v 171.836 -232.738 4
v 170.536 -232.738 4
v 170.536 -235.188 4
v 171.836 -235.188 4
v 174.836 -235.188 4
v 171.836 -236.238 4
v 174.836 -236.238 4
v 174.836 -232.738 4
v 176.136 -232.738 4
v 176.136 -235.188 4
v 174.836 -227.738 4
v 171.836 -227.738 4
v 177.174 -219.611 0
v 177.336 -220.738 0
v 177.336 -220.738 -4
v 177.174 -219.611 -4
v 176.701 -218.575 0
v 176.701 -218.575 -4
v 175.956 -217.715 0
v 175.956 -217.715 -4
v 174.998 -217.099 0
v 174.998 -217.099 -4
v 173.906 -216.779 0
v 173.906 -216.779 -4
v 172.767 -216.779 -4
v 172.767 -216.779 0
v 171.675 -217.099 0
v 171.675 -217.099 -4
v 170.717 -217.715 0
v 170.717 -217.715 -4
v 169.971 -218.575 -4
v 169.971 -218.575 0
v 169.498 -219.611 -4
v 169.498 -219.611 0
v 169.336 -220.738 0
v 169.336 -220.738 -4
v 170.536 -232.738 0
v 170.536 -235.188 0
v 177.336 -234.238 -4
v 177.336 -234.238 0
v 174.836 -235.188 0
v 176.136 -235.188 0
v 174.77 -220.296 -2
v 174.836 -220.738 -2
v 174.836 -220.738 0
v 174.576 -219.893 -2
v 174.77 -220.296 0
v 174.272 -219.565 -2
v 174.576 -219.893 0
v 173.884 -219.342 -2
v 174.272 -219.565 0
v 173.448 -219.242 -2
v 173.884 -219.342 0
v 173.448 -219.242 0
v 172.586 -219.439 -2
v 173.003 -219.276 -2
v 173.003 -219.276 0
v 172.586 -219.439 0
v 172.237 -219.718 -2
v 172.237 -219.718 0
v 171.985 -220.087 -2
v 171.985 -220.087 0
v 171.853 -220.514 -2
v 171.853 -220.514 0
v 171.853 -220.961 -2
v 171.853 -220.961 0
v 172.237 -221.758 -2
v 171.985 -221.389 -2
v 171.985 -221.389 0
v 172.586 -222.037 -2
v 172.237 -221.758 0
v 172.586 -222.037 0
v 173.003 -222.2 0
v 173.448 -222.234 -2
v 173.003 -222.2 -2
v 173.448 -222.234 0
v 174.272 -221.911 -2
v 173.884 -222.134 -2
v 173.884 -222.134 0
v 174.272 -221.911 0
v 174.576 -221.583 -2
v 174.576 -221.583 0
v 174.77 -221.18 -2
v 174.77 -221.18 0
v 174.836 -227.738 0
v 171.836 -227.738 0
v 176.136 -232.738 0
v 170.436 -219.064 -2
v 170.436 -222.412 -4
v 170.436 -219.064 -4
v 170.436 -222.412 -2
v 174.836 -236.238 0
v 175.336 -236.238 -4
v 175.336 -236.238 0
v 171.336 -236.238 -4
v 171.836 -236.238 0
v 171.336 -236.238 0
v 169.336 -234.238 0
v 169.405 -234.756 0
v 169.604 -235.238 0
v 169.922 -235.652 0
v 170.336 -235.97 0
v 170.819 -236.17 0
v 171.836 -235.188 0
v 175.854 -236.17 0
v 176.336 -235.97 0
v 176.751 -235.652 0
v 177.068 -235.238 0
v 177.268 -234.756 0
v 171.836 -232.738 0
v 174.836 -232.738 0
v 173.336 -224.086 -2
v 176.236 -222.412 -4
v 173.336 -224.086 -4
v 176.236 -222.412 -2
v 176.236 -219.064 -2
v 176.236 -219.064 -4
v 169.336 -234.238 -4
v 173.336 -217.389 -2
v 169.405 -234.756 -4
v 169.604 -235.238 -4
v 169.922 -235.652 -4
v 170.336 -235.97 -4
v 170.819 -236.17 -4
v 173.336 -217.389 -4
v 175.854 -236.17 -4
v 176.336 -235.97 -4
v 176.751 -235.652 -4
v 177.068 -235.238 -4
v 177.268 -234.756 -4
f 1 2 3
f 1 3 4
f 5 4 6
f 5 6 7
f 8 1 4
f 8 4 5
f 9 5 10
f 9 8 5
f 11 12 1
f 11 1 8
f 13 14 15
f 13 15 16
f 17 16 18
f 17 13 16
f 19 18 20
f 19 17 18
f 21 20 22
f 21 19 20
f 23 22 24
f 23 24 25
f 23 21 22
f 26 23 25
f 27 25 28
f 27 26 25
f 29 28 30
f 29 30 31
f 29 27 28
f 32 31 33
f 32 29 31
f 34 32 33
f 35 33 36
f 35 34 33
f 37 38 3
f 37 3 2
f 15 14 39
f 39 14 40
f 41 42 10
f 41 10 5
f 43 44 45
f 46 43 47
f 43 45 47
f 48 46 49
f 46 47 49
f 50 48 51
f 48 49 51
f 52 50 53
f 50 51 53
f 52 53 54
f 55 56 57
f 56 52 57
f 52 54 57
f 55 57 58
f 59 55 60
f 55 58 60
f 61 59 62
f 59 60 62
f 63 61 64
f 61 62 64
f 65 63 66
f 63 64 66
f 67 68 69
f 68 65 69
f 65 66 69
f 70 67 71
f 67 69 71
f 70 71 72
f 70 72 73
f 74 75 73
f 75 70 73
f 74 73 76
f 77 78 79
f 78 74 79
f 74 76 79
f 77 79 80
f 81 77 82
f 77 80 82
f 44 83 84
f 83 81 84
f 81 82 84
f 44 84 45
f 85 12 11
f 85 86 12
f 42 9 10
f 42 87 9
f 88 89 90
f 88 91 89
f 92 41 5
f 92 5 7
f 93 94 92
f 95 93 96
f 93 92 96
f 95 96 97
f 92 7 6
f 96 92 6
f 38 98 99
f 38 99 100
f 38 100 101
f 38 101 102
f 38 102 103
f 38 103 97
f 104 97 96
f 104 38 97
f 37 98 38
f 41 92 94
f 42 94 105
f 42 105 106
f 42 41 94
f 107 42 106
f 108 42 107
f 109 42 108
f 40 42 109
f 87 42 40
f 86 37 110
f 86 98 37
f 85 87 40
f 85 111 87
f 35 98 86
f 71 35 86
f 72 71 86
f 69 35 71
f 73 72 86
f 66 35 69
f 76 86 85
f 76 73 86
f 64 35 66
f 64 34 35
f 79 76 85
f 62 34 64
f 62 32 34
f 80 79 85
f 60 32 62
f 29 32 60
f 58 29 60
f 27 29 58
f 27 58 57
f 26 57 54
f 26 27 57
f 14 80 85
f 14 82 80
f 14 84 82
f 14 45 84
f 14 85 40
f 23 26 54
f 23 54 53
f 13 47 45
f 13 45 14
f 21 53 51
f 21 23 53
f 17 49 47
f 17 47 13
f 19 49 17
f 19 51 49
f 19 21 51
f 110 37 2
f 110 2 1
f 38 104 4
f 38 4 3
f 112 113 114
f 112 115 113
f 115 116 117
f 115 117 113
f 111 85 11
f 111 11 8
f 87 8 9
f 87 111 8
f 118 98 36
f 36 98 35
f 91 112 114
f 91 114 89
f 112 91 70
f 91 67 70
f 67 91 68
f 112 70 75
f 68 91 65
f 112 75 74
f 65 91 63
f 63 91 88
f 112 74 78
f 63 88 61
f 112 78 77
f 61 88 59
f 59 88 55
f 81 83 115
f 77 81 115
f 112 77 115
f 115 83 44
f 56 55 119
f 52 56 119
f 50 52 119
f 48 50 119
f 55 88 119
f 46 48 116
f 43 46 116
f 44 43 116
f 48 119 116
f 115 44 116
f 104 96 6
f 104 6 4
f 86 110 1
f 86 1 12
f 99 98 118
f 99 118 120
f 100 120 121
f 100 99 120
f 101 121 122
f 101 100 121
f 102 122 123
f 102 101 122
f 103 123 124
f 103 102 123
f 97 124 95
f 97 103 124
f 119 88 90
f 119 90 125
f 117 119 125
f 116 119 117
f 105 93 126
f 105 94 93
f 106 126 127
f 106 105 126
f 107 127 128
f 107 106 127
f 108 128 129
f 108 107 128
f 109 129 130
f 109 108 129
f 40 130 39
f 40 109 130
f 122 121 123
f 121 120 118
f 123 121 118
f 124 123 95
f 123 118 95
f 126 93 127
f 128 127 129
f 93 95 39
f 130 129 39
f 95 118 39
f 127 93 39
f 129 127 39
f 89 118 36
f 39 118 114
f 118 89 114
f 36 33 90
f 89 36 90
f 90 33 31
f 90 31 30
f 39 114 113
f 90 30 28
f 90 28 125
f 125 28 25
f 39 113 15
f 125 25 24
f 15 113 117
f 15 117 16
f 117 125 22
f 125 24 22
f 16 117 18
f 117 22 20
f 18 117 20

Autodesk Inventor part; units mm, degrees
ref_plane "YZ Plane" through (0, 0, 0) normal (1, 0, 0) x (0, 1, 0)
ref_plane "XZ Plane" through (0, 0, 0) normal (0, 1, 0) x (-1, 0, 0)
ref_plane "XY Plane" through (0, 0, 0) normal (0, 0, 1) x (1, 0, 0)
sketch "Эскиз1" plane through (0, 0, 0) normal (0, 0, 1) x (1, 0, 0)
  line L0 (330.6864, -227.7379) -> (330.6864, -232.7379)
  line L1 (330.6864, -232.7379) -> (331.9864, -232.7379)
  line L2 (331.9864, -232.7379) -> (331.9864, -235.1879)
  line L3 (331.9864, -235.1879) -> (330.6864, -235.1879)
  line L4 (330.6864, -235.1879) -> (330.6864, -236.2379)
  line L5 (330.6864, -236.2379) -> (327.6864, -236.2379)
  line L6 (327.6864, -236.2379) -> (327.6864, -235.1879)
  line L7 (327.6864, -235.1879) -> (326.3864, -235.1879)
  line L8 (326.3864, -235.1879) -> (326.3864, -232.7379)
  line L9 (326.3864, -232.7379) -> (327.6864, -232.7379)
  line L10 (327.6864, -232.7379) -> (327.6864, -227.7379)
  line L11 (327.6864, -227.7379) -> (289.8864, -227.7379)
  line L12 (289.8864, -227.7379) -> (289.8864, -223.7379)
  line L13 (289.8864, -223.7379) -> (212.4864, -223.7379)
  line L14 (212.4864, -223.7379) -> (212.4864, -227.7379)
  line L15 (212.4864, -227.7379) -> (174.8364, -227.7379)
  line L16 (174.8364, -227.7379) -> (174.8364, -232.7379)
  line L17 (174.8364, -232.7379) -> (176.1364, -232.7379)
  line L18 (176.1364, -232.7379) -> (176.1364, -235.1879)
  line L19 (176.1364, -235.1879) -> (174.8364, -235.1879)
  line L20 (174.8364, -235.1879) -> (174.8364, -236.2379)
  line L21 (174.8364, -236.2379) -> (171.8364, -236.2379)
  line L22 (171.8364, -236.2379) -> (171.8364, -235.1879)
  line L23 (171.8364, -235.1879) -> (170.5364, -235.1879)
  line L24 (170.5364, -235.1879) -> (170.5364, -232.7379)
  line L25 (170.5364, -232.7379) -> (171.8364, -232.7379)
  line L26 (171.8364, -232.7379) -> (171.8364, -227.7379)
  line L27 (171.8364, -227.7379) -> (134.1864, -227.7379)
  line L28 (134.1864, -227.7379) -> (134.1864, -735.7379) projected
  line L29 (134.1864, -735.7379) -> (184.1864, -735.7379) projected
  line L30 (184.1864, -735.7379) -> (184.1864, -437.7379) projected
  line L31 (184.1864, -437.7379) -> (204.1864, -417.7379)
  line L32 (204.1864, -417.7379) -> (454.1864, -417.7379)
  line L33 (454.1864, -417.7379) -> (474.1864, -437.7379)
  line L34 (474.1864, -437.7379) -> (474.1864, -735.7379) projected
  line L35 (474.1864, -735.7379) -> (524.1864, -735.7379) projected
  line L36 (524.1864, -735.7379) -> (524.1864, -227.7379) projected
  line L37 (524.1864, -227.7379) -> (486.5364, -227.7379)
  line L38 (486.5364, -227.7379) -> (486.5364, -232.7379)
  line L39 (486.5364, -232.7379) -> (487.8364, -232.7379)
  line L40 (487.8364, -232.7379) -> (487.8364, -235.1879)
  line L41 (487.8364, -235.1879) -> (486.5364, -235.1879)
  line L42 (486.5364, -235.1879) -> (486.5364, -236.2379)
  line L43 (486.5364, -236.2379) -> (483.5364, -236.2379)
  line L44 (483.5364, -236.2379) -> (483.5364, -235.1879)
  line L45 (483.5364, -235.1879) -> (482.2364, -235.1879)
  line L46 (482.2364, -235.1879) -> (482.2364, -232.7379)
  line L47 (482.2364, -232.7379) -> (483.5364, -232.7379)
  line L48 (483.5364, -232.7379) -> (483.5364, -227.7379)
  line L49 (483.5364, -227.7379) -> (445.8864, -227.7379)
  line L50 (445.8864, -227.7379) -> (445.8864, -223.7379)
  line L51 (445.8864, -223.7379) -> (368.4864, -223.7379)
  line L52 (368.4864, -223.7379) -> (368.4864, -227.7379)
  line L53 (368.4864, -227.7379) -> (330.6864, -227.7379)
  circle A0 centre (510.1864, -385.7379) radius 5
  circle A1 centre (148.1864, -385.7379) radius 5
  circle A2 centre (150.1864, -412.7379) radius 5
  circle A3 centre (508.1864, -412.7379) radius 5
  line L54 (198.0365, -283.9874) -> (198.0365, -274.4874)
  arc A4 (198.2865, -274.2374) -> (198.0365, -274.4874) centre (198.2865, -274.4874) ccw
  line L55 (198.2865, -274.2374) -> (220.2865, -274.2374)
  arc A5 (220.5365, -274.4874) -> (220.2865, -274.2374) centre (220.2865, -274.4874) ccw
  line L56 (220.5365, -274.4874) -> (220.5365, -283.9874)
  arc A6 (220.2865, -284.2374) -> (220.5365, -283.9874) centre (220.2865, -283.9874) ccw
  line L57 (220.2865, -284.2374) -> (198.2865, -284.2374)
  arc A7 (198.0365, -283.9874) -> (198.2865, -284.2374) centre (198.2865, -283.9874) ccw
  spline S0 degree 4 poles (220.5005, -310.507) (220.5003, -310.0397) (220.4543, -309.4219) (220.3063, -308.6946) (219.9828, -307.9126) (219.5846, -307.2407) (219.1485, -306.7849) (218.7486, -306.4926) (218.4341, -306.3133) knots 0 0 0 0 0 0.333261 0.458786 0.580687 0.70052 1 1 1 1 1
  spline S1 degree 4 poles (218.4341, -306.3133) (218.2194, -306.2045) (217.9574, -306.0638) (217.2245, -305.8515) (216.8112, -305.759) (215.0952, -305.8521) (214.8239, -305.815) knots 0 0 0 0 0 0.331948 0.48487 1 1 1 1 1
  line L58 (214.8239, -305.815) -> (210.9827, -305.815)
  line L59 (210.9827, -305.815) -> (210.9827, -303.0192)
  line L60 (210.9827, -303.0192) -> (215.6262, -303.0192)
  spline S2 degree 4 poles (215.6262, -303.0192) (216.0632, -302.9791) (218.3041, -303.1205) (219.1074, -303.2602) (220.3376, -303.6977) (220.8048, -303.9727) (221.1813, -304.1983) knots 0 0 0 0 0 0.48869 0.646796 1 1 1 1 1
  spline S3 degree 4 poles (221.1813, -304.1983) (221.6328, -304.4905) (222.2206, -304.9662) (222.87, -305.6808) (223.5166, -306.727) (224.0456, -307.8865) (224.2868, -308.9631) (224.3652, -309.8569) (224.366, -310.5313) knots 0 0 0 0 0 0.30127 0.423004 0.546367 0.672176 1 1 1 1 1
  spline S4 degree 4 poles (224.366, -310.5313) (224.3672, -311.1836) (224.2819, -312.0637) (224.0275, -313.128) (223.4629, -314.3083) (222.7851, -315.3791) (222.1412, -316.0885) (221.5656, -316.5539) (221.1326, -316.8279) knots 0 0 0 0 0 0.325829 0.453052 0.578284 0.70143 1 1 1 1 1
  spline S5 degree 4 poles (221.1326, -316.8279) (220.7893, -317.0305) (220.3484, -317.2658) (219.1646, -317.6777) (218.3558, -317.7448) (216.0857, -318.1145) (215.6748, -318.0192) knots 0 0 0 0 0 0.345082 0.503845 1 1 1 1 1
  line L61 (215.6748, -318.0192) -> (210.9827, -318.0192)
  line L62 (210.9827, -318.0192) -> (210.9827, -315.2112)
  line L63 (210.9827, -315.2112) -> (214.8239, -315.2112)
  spline S6 degree 4 poles (214.8239, -315.2112) (215.1741, -315.246) (216.9237, -315.0068) (217.3918, -315.0434) (218.1403, -314.8454) (218.4072, -314.7315) (218.6164, -314.6278) knots 0 0 0 0 0 0.523746 0.675711 1 1 1 1 1
  spline S7 degree 4 poles (218.6164, -314.6278) (218.8947, -314.4519) (219.2518, -314.164) (219.6429, -313.721) (220.0126, -313.068) (220.3184, -312.3077) (220.4565, -311.5867) (220.5004, -310.9747) (220.5005, -310.507) knots 0 0 0 0 0 0.293933 0.413176 0.535292 0.661734 1 1 1 1 1
  line L64 (206.7865, -285.7374) -> (206.7865, -284.7374)
  line L65 (206.7865, -284.7374) -> (211.7865, -284.7374)
  line L66 (211.7865, -284.7374) -> (211.7865, -285.7374)
  line L67 (211.7865, -285.7374) -> (213.7865, -285.7374)
  line L68 (213.7865, -285.7374) -> (213.7865, -288.7374)
  spline S8 degree 4 poles (213.7865, -288.7374) (213.6519, -288.8139) (213.4737, -288.7819) (213.3015, -288.643) (213.0567, -288.4771) (212.69, -288.3556) (212.2603, -288.4723) (211.871, -288.6284) (211.5365, -288.7374) knots 0 0 0 0 0 0.262205 0.367936 0.481015 0.607227 1 1 1 1 1
  spline S9 degree 4 poles (211.5365, -288.7374) (211.1505, -288.9432) (210.6435, -289.1648) (210.0259, -289.3413) (209.2886, -289.3933) (208.5507, -289.3412) (207.9319, -289.1646) (207.4237, -288.9431) (207.0365, -288.7374) knots 0 0 0 0 0 0.321352 0.440904 0.558717 0.678328 1 1 1 1 1
  spline S10 degree 4 poles (207.0365, -288.7374) (206.8474, -288.9124) (206.596, -289.091) (206.2892, -289.2192) (205.9233, -289.2608) (205.553, -289.2318) (205.2381, -289.1011) (204.981, -288.9152) (204.7865, -288.7374) knots 0 0 0 0 0 0.325734 0.441296 0.554264 0.670467 1 1 1 1 1
  line L69 (204.7865, -288.7374) -> (204.7865, -285.7374)
  line L70 (204.7865, -285.7374) -> (206.7865, -285.7374)
  line L71 (209.6615, -293.1605) -> (208.9115, -293.1605)
  line L72 (208.9115, -293.1605) -> (205.8815, -289.9115)
  spline S11 degree 4 poles (205.8815, -289.9115) (205.9805, -289.9087) (206.1201, -289.8928) (206.2986, -289.8511) (206.5123, -289.7699) (206.7297, -289.6659) (206.9037, -289.5566) (207.0382, -289.4574) (207.1348, -289.3787) knots 0 0 0 0 0 0.300687 0.4228 0.546613 0.672716 1 1 1 1 1
  spline S12 degree 4 poles (207.1348, -289.3787) (207.4869, -289.5458) (207.9624, -289.7299) (208.5607, -289.88) (209.2865, -289.9251) (210.0123, -289.88) (210.6106, -289.7298) (211.0863, -289.5458) (211.4383, -289.3787) knots 0 0 0 0 0 0.318028 0.439699 0.56029 0.681964 1 1 1 1 1
  spline S13 degree 4 poles (211.4383, -289.3787) (211.5621, -289.4198) (211.726, -289.4782) (211.9234, -289.5547) (212.1488, -289.6486) (212.3519, -289.7369) (212.5071, -289.8094) (212.6189, -289.8675) (212.6916, -289.9115) knots 0 0 0 0 0 0.337221 0.465736 0.590517 0.711668 1 1 1 1 1
  line L73 (212.6916, -289.9115) -> (209.6615, -293.1605)
  line L74 (214.751, -315.1701) -> (210.9827, -315.1701)
  line L75 (210.9827, -315.1701) -> (210.9827, -305.8193)
  line L76 (210.9827, -305.8193) -> (214.751, -305.8193)
  line L77 (214.751, -305.8193) -> (214.751, -315.1701)
  arc A8 (209.7865, -300.4106) -> (208.2865, -298.9106) centre (208.2865, -300.4106) ccw
  line L78 (209.7865, -300.4106) -> (209.7865, -300.9106)
  line L79 (209.7865, -300.9106) -> (208.7865, -300.9106)
  line L80 (208.7865, -300.9106) -> (208.7865, -300.4106)
  arc A9 (208.7865, -300.4106) -> (208.2865, -299.9106) centre (208.2865, -300.4106) ccw
  line L81 (208.2865, -299.9106) -> (201.7865, -299.9106)
  arc A10 (201.7865, -296.9106) -> (201.7865, -299.9106) centre (201.7865, -298.4106) ccw
  line L82 (201.7865, -296.9106) -> (216.7865, -296.9106)
  arc A11 (216.7865, -296.9106) -> (216.7865, -295.9106) centre (216.7865, -296.4106) ccw
  line L83 (216.7865, -295.9106) -> (210.2865, -295.9106)
  arc A12 (208.7865, -294.4106) -> (210.2865, -295.9106) centre (210.2865, -294.4106) ccw
  line L84 (208.7865, -294.4106) -> (208.7865, -293.9106)
  line L85 (208.7865, -293.9106) -> (209.7865, -293.9106)
  line L86 (209.7865, -293.9106) -> (209.7865, -294.4106)
  arc A13 (209.7865, -294.4106) -> (210.2865, -294.9106) centre (210.2865, -294.4106) ccw
  line L87 (210.2865, -294.9106) -> (216.7865, -294.9106)
  arc A14 (216.7865, -297.9106) -> (216.7865, -294.9106) centre (216.7865, -296.4106) ccw
  line L88 (216.7865, -297.9106) -> (201.7865, -297.9106)
  arc A15 (201.7865, -297.9106) -> (201.7865, -298.9106) centre (201.7865, -298.4106) ccw
  line L89 (201.7865, -298.9106) -> (208.2865, -298.9106)
  spline S14 degree 4 poles (206.5338, -303.6148) (206.7685, -303.7597) (207.0659, -303.9867) (207.3902, -304.3236) (207.6872, -304.8028) (207.9226, -305.3279) (208.031, -305.7914) (208.0657, -306.1761) (208.0654, -306.4592) knots 0 0 0 0 0 0.312949 0.435922 0.558791 0.682637 1 1 1 1 1
  spline S15 degree 4 poles (208.0654, -306.4592) (208.0667, -306.8455) (207.9969, -307.373) (207.7865, -307.9991) (207.3334, -308.6976) (206.7816, -309.3133) (206.2308, -309.6699) (205.74, -309.8607) (205.3668, -309.9479) knots 0 0 0 0 0 0.313918 0.438715 0.563217 0.687663 1 1 1 1 1
  line L90 (205.3668, -309.9479) -> (205.3668, -310.0937)
  spline S16 degree 4 poles (205.3668, -310.0937) (205.5312, -310.0712) (206.2732, -310.3709) (206.5855, -310.4525) (207.0618, -310.7261) (207.2515, -310.8673) (207.409, -310.9933) knots 0 0 0 0 0 0.467412 0.627499 1 1 1 1 1
  spline S17 degree 4 poles (207.409, -310.9933) (207.5481, -311.1133) (207.7331, -311.307) (207.9398, -311.5886) (208.1607, -311.9975) (208.3429, -312.4401) (208.4267, -312.8625) (208.4538, -313.2077) (208.4544, -313.473) knots 0 0 0 0 0 0.293401 0.414689 0.538726 0.665972 1 1 1 1 1
  spline S18 degree 4 poles (208.4544, -313.473) (208.4542, -313.8182) (208.4167, -314.2867) (208.3007, -314.8566) (208.0496, -315.5046) (207.7363, -316.1003) (207.4002, -316.53) (207.0921, -316.8283) (206.8498, -317.0224) knots 0 0 0 0 0 0.321122 0.446176 0.569734 0.692519 1 1 1 1 1
  spline S19 degree 4 poles (206.8498, -317.0224) (206.6091, -317.215) (206.2427, -317.4621) (205.7289, -317.7312) (205.0243, -317.9925) (204.2362, -318.2079) (203.4791, -318.3046) (202.8516, -318.3351) (202.3644, -318.3352) knots 0 0 0 0 0 0.288505 0.407246 0.52959 0.656869 1 1 1 1 1
  spline S20 degree 4 poles (202.3644, -318.3352) (200.7651, -318.3047) (199.5638, -318.1496) (198.2039, -317.74) (197.3198, -317.3871) knots 0 0 0 0 0 1 1 1 1 1
  line L91 (197.3198, -317.3871) -> (197.3198, -314.1294)
  line L92 (197.3198, -314.1294) -> (197.6845, -314.1294)
  spline S21 degree 4 poles (197.6845, -314.1294) (197.8963, -314.3375) (199.3348, -314.8985) (200.0458, -315.1512) (200.9862, -315.3661) (201.3735, -315.4088) (201.6594, -315.43) knots 0 0 0 0 0 0.485606 0.650571 1 1 1 1 1
  spline S22 degree 4 poles (201.6594, -315.43) (201.8017, -315.4566) (202.7287, -315.3618) (203.1091, -315.3075) (203.6053, -315.1248) (203.7864, -315.012) (203.9203, -314.9195) knots 0 0 0 0 0 0.490597 0.653392 1 1 1 1 1
  spline S23 degree 4 poles (203.9203, -314.9195) (204.0251, -314.8403) (204.1632, -314.7177) (204.3146, -314.5417) (204.4732, -314.2933) (204.5993, -314.0182) (204.6569, -313.7148) (204.6734, -313.4623) (204.674, -313.2542) knots 0 0 0 0 0 0.293695 0.410721 0.530018 0.654429 1 1 1 1 1
  spline S24 degree 4 poles (204.674, -313.2542) (204.6737, -313.05) (204.65, -312.7949) (204.5704, -312.5) (204.3941, -312.2275) (204.1685, -311.9914) (203.9524, -311.8427) (203.754, -311.7508) (203.6043, -311.6983) knots 0 0 0 0 0 0.332874 0.455336 0.574642 0.693712 1 1 1 1 1
  spline S25 degree 3 poles (203.6043, -311.6983) (203.1339, -311.419) (202.8478, -311.2752) (201.2461, -311.4916) knots 0 0 0 0 1 1 1 1
  line L93 (201.2461, -311.4916) -> (200.6018, -311.4916)
  line L94 (200.6018, -311.4916) -> (200.6018, -308.8539)
  line L95 (200.6018, -308.8539) -> (201.1975, -308.8539)
  spline S26 degree 4 poles (201.1975, -308.8539) (201.8646, -308.8347) (202.5816, -308.7738) (203.0974, -308.7347) (203.4341, -308.55) knots 0 0 0 0 0 1 1 1 1 1
  spline S27 degree 4 poles (203.4341, -308.55) (203.5568, -308.4899) (203.7161, -308.3919) (203.8905, -308.2415) (204.0639, -308.0177) (204.2017, -307.7644) (204.265, -307.4981) (204.2843, -307.2719) (204.285, -307.0913) knots 0 0 0 0 0 0.303428 0.422137 0.541736 0.664935 1 1 1 1 1
  spline S28 degree 4 poles (204.285, -307.0913) (204.2846, -306.9506) (204.2677, -306.7719) (204.2092, -306.5582) (204.0845, -306.3506) (203.9226, -306.1579) (203.7804, -306.033) (203.6505, -305.9492) (203.5557, -305.9001) knots 0 0 0 0 0 0.328861 0.453441 0.575803 0.697309 1 1 1 1 1
  spline S29 degree 4 poles (203.5557, -305.9001) (203.4448, -305.8495) (203.2969, -305.7896) (202.9114, -305.6871) (202.6272, -305.6603) (201.9555, -305.5746) (201.8782, -305.5962) knots 0 0 0 0 0 0.352064 0.518119 1 1 1 1 1
  spline S30 degree 4 poles (201.8782, -305.5962) (201.3241, -305.5966) (200.7829, -305.6848) (200.1681, -305.8558) (199.6416, -306.0581) knots 0 0 0 0 0 1 1 1 1 1
  spline S31 degree 3 poles (199.6416, -306.0581) (200.0559, -305.6978) (203.2118, -303.6988) (198.2887, -306.7332) knots 0 0 0 0 1 1 1 1
  line L96 (198.2887, -306.7332) -> (197.8235, -306.8604)
  line L97 (197.8235, -306.8604) -> (197.7574, -306.8604)
  line L98 (197.7574, -306.8604) -> (197.7574, -303.6513)
  spline S32 degree 4 poles (197.7574, -303.6513) (198.6005, -303.3178) (200.0612, -302.9118) (201.2135, -302.7136) (202.5346, -302.7031) knots 0 0 0 0 0 1 1 1 1 1
  spline S33 degree 4 poles (202.5346, -302.7031) (203.7734, -302.7074) (204.8441, -302.8363) (205.7919, -303.1378) (206.5338, -303.6148) knots 0 0 0 0 0 1 1 1 1 1
  line L99 (209.1913, -331.2373) -> (209.1913, -324.7373)
  arc A16 (209.1913, -324.7373) -> (209.1912, -324.7373) centre (209.2865, -297.2374) ccw
  line L100 (209.1912, -324.7373) -> (209.1912, -331.2373)
  arc A17 (204.7865, -330.9383) -> (209.1912, -331.2373) centre (209.2865, -297.2374) ccw
  arc A18 (203.0365, -327.6009) -> (204.7865, -330.9383) centre (216.5671, -322.6337) ccw
  arc A19 (192.2358, -323.127) -> (203.0365, -327.6009) centre (209.2865, -297.2374) ccw
  arc A20 (188.6384, -324.2495) -> (192.2358, -323.127) centre (186.1806, -310.0472) ccw
  arc A21 (182.2744, -317.8856) -> (188.6384, -324.2495) centre (209.2865, -297.2374) ccw
  arc A22 (183.3969, -314.2882) -> (182.2744, -317.8856) centre (196.4768, -320.3434) ccw
  arc A23 (178.9231, -303.4874) -> (183.3969, -314.2882) centre (209.2865, -297.2374) ccw
  arc A24 (175.5856, -301.7374) -> (178.9231, -303.4874) centre (183.8903, -289.9569) ccw
  arc A25 (175.5856, -292.7374) -> (175.5856, -301.7374) centre (209.2865, -297.2374) ccw
  arc A26 (178.9231, -290.9874) -> (175.5856, -292.7374) centre (183.8903, -304.518) ccw
  arc A27 (183.3969, -280.1867) -> (178.9231, -290.9874) centre (209.2865, -297.2374) ccw
  arc A28 (182.2744, -276.5893) -> (183.3969, -280.1867) centre (196.4768, -274.1315) ccw
  arc A29 (188.6384, -270.2253) -> (182.2744, -276.5893) centre (209.2865, -297.2374) ccw
  arc A30 (192.2358, -271.3478) -> (188.6384, -270.2253) centre (186.1806, -284.4277) ccw
  arc A31 (203.0365, -266.874) -> (192.2358, -271.3478) centre (209.2865, -297.2374) ccw
  arc A32 (204.7865, -263.5365) -> (203.0365, -266.874) centre (216.5671, -271.8412) ccw
  arc A33 (213.7865, -263.5365) -> (204.7865, -263.5365) centre (209.2865, -297.2374) ccw
  arc A34 (215.5365, -266.874) -> (213.7865, -263.5365) centre (202.006, -271.8412) ccw
  arc A35 (226.3373, -271.3478) -> (215.5365, -266.874) centre (209.2865, -297.2374) ccw
  arc A36 (229.9347, -270.2253) -> (226.3373, -271.3478) centre (232.3925, -284.4277) ccw
  arc A37 (236.2986, -276.5893) -> (229.9347, -270.2253) centre (209.2865, -297.2374) ccw
  arc A38 (235.1761, -280.1867) -> (236.2986, -276.5893) centre (222.0963, -274.1315) ccw
  arc A39 (239.65, -290.9874) -> (235.1761, -280.1867) centre (209.2865, -297.2374) ccw
  arc A40 (242.9874, -292.7374) -> (239.65, -290.9874) centre (234.6828, -304.518) ccw
  arc A41 (242.9874, -301.7374) -> (242.9874, -292.7374) centre (209.2865, -297.2374) ccw
  arc A42 (239.65, -303.4874) -> (242.9874, -301.7374) centre (234.6828, -289.9569) ccw
  arc A43 (235.1761, -314.2882) -> (239.65, -303.4874) centre (209.2865, -297.2374) ccw
  arc A44 (236.2986, -317.8856) -> (235.1761, -314.2882) centre (222.0963, -320.3434) ccw
  arc A45 (229.9347, -324.2495) -> (236.2986, -317.8856) centre (209.2865, -297.2374) ccw
  arc A46 (226.3373, -323.127) -> (229.9347, -324.2495) centre (232.3925, -310.0472) ccw
  arc A47 (215.5365, -327.6009) -> (226.3373, -323.127) centre (209.2865, -297.2374) ccw
  arc A48 (213.7865, -330.9383) -> (215.5365, -327.6009) centre (202.006, -322.6337) ccw
  arc A49 (209.1913, -331.2373) -> (213.7865, -330.9383) centre (209.2865, -297.2374) ccw
  circle A50 centre (330.1864, -297.7379) radius 20.6
  circle A51 centre (508.6864, -721.7379) radius 2 projected
  circle A52 centre (149.6864, -682.2379) radius 2 projected
  circle A53 centre (149.6864, -424.7379) radius 2
  circle A54 centre (508.6864, -424.7379) radius 2
  circle A55 centre (508.6864, -506.7379) radius 2.875 projected
  circle A56 centre (149.6864, -453.7379) radius 2
  circle A57 centre (149.6864, -721.7379) radius 2 projected
  circle A58 centre (170.4364, -639.7379) radius 1.5 projected
  circle A59 centre (170.4364, -507.7379) radius 1.5 projected
  circle A60 centre (170.4364, -477.7379) radius 1.5
  circle A61 centre (170.4364, -669.7379) radius 1.5 projected
  circle A62 centre (479.4534, -583.2596) radius 1.5 projected
  line L101 (445.4108, -378.2955) -> (445.4108, -381.1733)
  line L102 (445.4108, -381.1733) -> (439.6177, -381.1733)
  line L103 (439.6177, -381.1733) -> (439.3174, -383.1252)
  spline S34 degree 4 poles (439.3174, -383.1252) (439.8832, -382.9763) (440.4727, -382.8362) (441.0568, -382.6943) (441.6697, -382.5621) knots 0 0 0 0 0 1 1 1 1 1
  spline S35 degree 4 poles (441.6697, -382.5621) (442.2638, -382.5598) (443.052, -382.6679) (443.9476, -382.9985) (444.8569, -383.7336) (445.5947, -384.609) (445.9315, -385.4454) (446.0393, -386.1746) (446.0364, -386.7161) knots 0 0 0 0 0 0.321 0.445325 0.568168 0.690637 1 1 1 1 1
  spline S36 degree 4 poles (446.0364, -386.7161) (446.0346, -387.3159) (445.9109, -388.0809) (445.4981, -389.1528) (444.7052, -390.1668) (443.6543, -391.0177) (442.5576, -391.4124) (441.5087, -391.5161) (440.7063, -391.5207) knots 0 0 0 0 0 0.301808 0.422596 0.543783 0.666952 1 1 1 1 1
  spline S37 degree 4 poles (440.7063, -391.5207) (439.918, -391.5188) (438.9727, -391.4394) (437.9148, -391.1682) (436.9202, -390.5588) (436.1038, -389.8278) (435.6627, -389.1519) (435.3981, -388.4698) (435.2385, -387.9298) knots 0 0 0 0 0 0.344288 0.467767 0.585513 0.701061 1 1 1 1 1
  line L104 (435.2385, -387.9298) -> (438.892, -387.5294)
  spline S38 degree 4 poles (438.892, -387.5294) (438.9412, -387.7989) (439.0435, -388.1412) (439.2278, -388.5159) (439.5476, -388.8668) (439.8937, -389.136) (440.207, -389.2665) (440.4728, -389.3137) (440.6687, -389.3186) knots 0 0 0 0 0 0.337823 0.463732 0.585419 0.704571 1 1 1 1 1
  spline S39 degree 4 poles (440.6687, -389.3186) (440.8901, -389.3188) (441.1893, -389.2693) (441.5319, -389.1156) (441.8931, -388.7807) (442.2105, -388.3375) (442.349, -387.842) (442.3952, -387.3979) (442.3954, -387.0414) knots 0 0 0 0 0 0.288865 0.405011 0.524609 0.650411 1 1 1 1 1
  spline S40 degree 4 poles (442.3954, -387.0414) (442.3965, -386.6796) (442.3506, -386.2306) (442.2143, -385.7358) (441.8934, -385.3038) (441.5184, -384.9825) (441.1547, -384.8384) (440.8338, -384.7976) (440.5936, -384.8018) knots 0 0 0 0 0 0.347295 0.471219 0.589277 0.705046 1 1 1 1 1
  spline S41 degree 4 poles (440.5936, -384.8018) (440.3308, -384.8028) (440.0722, -384.8472) (439.8214, -384.9358) (439.5802, -385.0645) knots 0 0 0 0 0 1 1 1 1 1
  spline S42 degree 4 poles (439.5802, -385.0645) (439.4113, -385.0419) (439.2106, -385.2032) (439.0118, -385.4464) (438.7919, -385.7277) knots 0 0 0 0 0 1 1 1 1 1
  line L105 (438.7919, -385.7277) -> (435.714, -385.2897)
  line L106 (435.714, -385.2897) -> (436.8526, -378.2955)
  line L107 (436.8526, -378.2955) -> (445.4108, -378.2955)
  spline S43 degree 4 poles (406.7861, -386.7537) (406.783, -386.8994) (406.9374, -387.4742) (407.0204, -387.7031) (407.1624, -387.996) (407.2325, -388.1023) (407.2866, -388.18) knots 0 0 0 0 0 0.506296 0.664932 1 1 1 1 1
  spline S44 degree 4 poles (407.2866, -388.18) (407.382, -388.3002) (407.5282, -388.4525) (407.7394, -388.6182) (408.0321, -388.7711) (408.3561, -388.8938) (408.6492, -388.9503) (408.8932, -388.9682) (409.0758, -388.9683) knots 0 0 0 0 0 0.304407 0.425791 0.548382 0.673395 1 1 1 1 1
  spline S45 degree 4 poles (409.0758, -388.9683) (409.3418, -388.9666) (409.6834, -388.9198) (410.0596, -388.803) (410.4185, -388.5341) (410.6892, -388.2467) (410.8181, -387.9944) (410.8631, -387.7819) (410.8651, -387.6295) knots 0 0 0 0 0 0.349494 0.478462 0.601477 0.719585 1 1 1 1 1
  spline S46 degree 4 poles (410.8651, -387.6295) (410.8651, -387.5535) (410.8554, -387.4485) (410.8248, -387.3165) (410.7593, -387.1612) (410.6716, -387.0048) (410.5753, -386.883) (410.4859, -386.792) (410.4146, -386.7286) knots 0 0 0 0 0 0.300852 0.421911 0.544763 0.670489 1 1 1 1 1
  spline S47 degree 4 poles (410.4146, -386.7286) (410.1571, -386.5044) (409.6674, -386.3111) (409.0725, -386.1312) (408.3627, -385.9654) knots 0 0 0 0 0 1 1 1 1 1
  spline S48 degree 4 poles (408.3627, -385.9654) (407.1494, -385.6938) (406.0889, -385.3543) (405.2024, -384.9288) (404.584, -384.3889) knots 0 0 0 0 0 1 1 1 1 1
  spline S49 degree 4 poles (404.584, -384.3889) (404.408, -384.2361) (404.1857, -384.0093) (403.9447, -383.6933) (403.7233, -383.2707) (403.5506, -382.824) (403.4707, -382.4311) (403.4454, -382.1105) (403.4454, -381.874) knots 0 0 0 0 0 0.314239 0.437484 0.560343 0.683894 1 1 1 1 1
  spline S50 degree 4 poles (403.4454, -381.874) (403.4449, -381.4151) (403.5577, -380.8163) (403.9167, -380.0101) (404.6502, -379.2264) (405.7309, -378.5045) (406.8706, -378.1485) (408.0596, -378.0831) (408.9757, -378.0703) knots 0 0 0 0 0 0.276596 0.390848 0.509627 0.635941 1 1 1 1 1
  spline S51 degree 4 poles (408.9757, -378.0703) (409.7519, -378.0735) (410.7314, -378.1522) (411.8268, -378.4191) (412.8553, -379.0125) (413.6516, -379.7584) (414.0771, -380.5932) (414.2667, -381.3518) (414.3434, -381.949) knots 0 0 0 0 0 0.340632 0.462675 0.579541 0.695373 1 1 1 1 1
  line L108 (414.3434, -381.949) -> (410.5523, -382.1743)
  spline S52 degree 4 poles (410.5523, -382.1743) (410.5026, -381.9089) (410.4058, -381.5777) (410.2218, -381.2167) (409.9086, -380.8975) (409.5367, -380.6514) (409.1622, -380.5366) (408.8314, -380.5001) (408.5754, -380.4976) knots 0 0 0 0 0 0.324684 0.444588 0.562205 0.68129 1 1 1 1 1
  spline S53 degree 4 poles (408.5754, -380.4976) (408.3547, -380.4984) (408.0765, -380.531) (407.7733, -380.6151) (407.4955, -380.8115) (407.2908, -381.0256) (407.1945, -381.225) (407.1626, -381.397) (407.1615, -381.5236) knots 0 0 0 0 0 0.354168 0.481315 0.601534 0.717295 1 1 1 1 1
  spline S54 degree 4 poles (407.1615, -381.5236) (407.151, -381.5513) (407.1425, -381.5923) (407.1555, -381.6537) (407.1952, -381.7382) (407.2603, -381.845) (407.3352, -381.9396) (407.4052, -382.0169) (407.4618, -382.0742) knots 0 0 0 0 0 0.247386 0.359721 0.483602 0.619276 1 1 1 1 1
  spline S55 degree 4 poles (407.4618, -382.0742) (407.502, -382.1096) (407.5742, -382.1593) (407.6951, -382.2227) (407.9699, -382.3345) (408.225, -382.4111) (408.4138, -382.46) (408.8131, -382.5496) knots 0 0 0 0 0 0.265093 0.389381 0.526504 1 1 1 1 1
  spline S56 degree 4 poles (408.8131, -382.5496) (409.9591, -382.8033) (411.5127, -383.2002) (412.6708, -383.6431) (413.7254, -384.4472) (414.3811, -385.2229) (414.6765, -385.9927) (414.7705, -386.6006) (414.7688, -387.0665) knots 0 0 0 0 0 0.389595 0.513425 0.625734 0.733468 1 1 1 1 1
  spline S57 degree 4 poles (414.7688, -387.0665) (414.7651, -387.6424) (414.6429, -388.3842) (414.1942, -389.3533) (413.3387, -390.2809) (412.195, -391.0651) (411.0021, -391.4207) (409.8737, -391.5173) (409.0008, -391.5207) knots 0 0 0 0 0 0.292777 0.410851 0.531211 0.655943 1 1 1 1 1
  spline S58 degree 4 poles (409.0008, -391.5207) (407.9895, -391.5206) (406.7811, -391.4067) (405.4293, -391.0713) (404.3652, -390.2519) (403.5782, -389.2777) (403.1749, -388.3819) (403.0083, -387.5819) (402.9575, -386.9914) knots 0 0 0 0 0 0.35491 0.478284 0.59487 0.709037 1 1 1 1 1
  line L109 (402.9575, -386.9914) -> (406.7861, -386.7537)
  spline S59 degree 4 poles (394.7371, -378.0703) (395.7191, -378.07) (396.9898, -378.2189) (398.4153, -378.6999) (399.7793, -379.7808) (400.8604, -381.1289) (401.3447, -382.5175) (401.4939, -383.753) (401.4936, -384.7017) knots 0 0 0 0 0 0.321996 0.442966 0.562085 0.682373 1 1 1 1 1
  spline S60 degree 4 poles (401.4936, -384.7017) (401.4851, -385.7192) (401.3652, -387.0404) (400.8679, -388.4392) (399.8128, -389.7826) (398.4904, -390.8562) (397.1164, -391.3853) (395.8566, -391.5119) (394.8872, -391.5207) knots 0 0 0 0 0 0.324201 0.444012 0.561748 0.68112 1 1 1 1 1
  spline S61 degree 4 poles (394.8872, -391.5207) (393.9051, -391.5237) (392.6153, -391.3825) (391.2354, -390.9616) (389.8902, -389.9369) (388.7595, -388.5767) (388.1566, -387.1369) (388.0342, -385.8227) (388.0181, -384.8018) knots 0 0 0 0 0 0.317732 0.436395 0.554274 0.675018 1 1 1 1 1
  spline S62 degree 4 poles (388.0181, -384.8018) (388.017, -383.8398) (388.1688, -382.5871) (388.6587, -381.1773) (389.7545, -379.8084) (391.1224, -378.7124) (392.5286, -378.2217) (393.7783, -378.0695) (394.7371, -378.0703) knots 0 0 0 0 0 0.319418 0.440426 0.560018 0.68097 1 1 1 1 1
  line L110 (364.7958, -383.8884) -> (371.0017, -383.8884)
  line L111 (371.0017, -383.8884) -> (371.0017, -389.4187)
  spline S63 degree 4 poles (371.0017, -389.4187) (369.2773, -390.5761) (367.9432, -391.1503) (366.483, -391.341) (364.5956, -391.5207) knots 0 0 0 0 0 1 1 1 1 1
  spline S64 degree 4 poles (364.5956, -391.5207) (363.5663, -391.5174) (362.2259, -391.3822) (360.8136, -390.891) (359.4739, -389.7879) (358.4229, -388.4046) (357.8973, -386.926) (357.756, -385.7341) (357.7515, -384.7893) knots 0 0 0 0 0 0.324055 0.444084 0.562865 0.683419 1 1 1 1 1
  spline S65 degree 4 poles (357.7515, -384.7893) (357.7514, -384.1263) (357.8305, -383.2389) (358.08, -382.1878) (358.6262, -381.0385) (359.3014, -380.0325) (360.0273, -379.366) (360.6882, -378.9465) (361.2048, -378.6959) knots 0 0 0 0 0 0.325345 0.450117 0.57259 0.694038 1 1 1 1 1
  spline S66 degree 4 poles (361.2048, -378.6959) (361.9122, -378.363) (362.7618, -378.1622) (363.7151, -378.0709) (364.7582, -378.0703) knots 0 0 0 0 0 1 1 1 1 1
  spline S67 degree 4 poles (364.7582, -378.0703) (365.6777, -378.0749) (366.95, -378.1343) (367.9815, -378.3613) (369.0464, -378.967) (369.8787, -379.6881) (370.3859, -380.4767) (370.6707, -381.1881) (370.8266, -381.7488) knots 0 0 0 0 0 0.355167 0.475286 0.589187 0.703074 1 1 1 1 1
  line L112 (370.8266, -381.7488) -> (366.9478, -382.4495)
  spline S68 degree 4 poles (366.9478, -382.4495) (366.8814, -382.2273) (366.7537, -381.9399) (366.5276, -381.6226) (366.158, -381.3184) (365.7254, -381.0709) (365.3057, -380.9576) (364.9456, -380.9221) (364.6706, -380.923) knots 0 0 0 0 0 0.306162 0.426653 0.548001 0.672045 1 1 1 1 1
  spline S69 degree 4 poles (364.6706, -380.923) (364.2835, -380.9239) (363.7673, -381.0025) (363.1828, -381.2508) (362.5857, -381.7934) (362.0729, -382.5227) (361.8522, -383.3711) (361.781, -384.1317) (361.7804, -384.7517) knots 0 0 0 0 0 0.291183 0.405965 0.523705 0.648116 1 1 1 1 1
  spline S70 degree 4 poles (361.7804, -384.7517) (361.779, -385.4039) (361.8504, -386.201) (362.0651, -387.0776) (362.5841, -387.8163) (363.2003, -388.3522) (363.8218, -388.5952) (364.3751, -388.6679) (364.7958, -388.668) knots 0 0 0 0 0 0.352198 0.4751 0.591203 0.705096 1 1 1 1 1
  spline S71 degree 4 poles (364.7958, -388.668) (365.5044, -388.577) (366.1093, -388.5966) (366.7466, -388.3761) (367.4859, -387.8047) knots 0 0 0 0 0 1 1 1 1 1
  line L113 (367.4859, -387.8047) -> (367.4859, -386.591)
  line L114 (367.4859, -386.591) -> (364.7958, -386.591)
  line L115 (364.7958, -386.591) -> (364.7958, -383.8884)
  line L116 (338.1076, -378.2955) -> (344.8015, -378.2955)
  spline S72 degree 4 poles (344.8015, -378.2955) (345.6091, -378.3087) (346.7113, -378.4377) (347.6525, -378.6374) (348.5774, -379.2274) (349.2936, -379.9502) (349.6937, -380.7224) (349.8093, -381.3789) (349.8314, -381.899) knots 0 0 0 0 0 0.352761 0.473532 0.588688 0.703565 1 1 1 1 1
  spline S73 degree 4 poles (349.8314, -381.899) (349.8301, -382.2318) (349.7876, -382.6715) (349.6583, -383.1996) (349.3774, -383.7638) (349.0247, -384.2843) (348.6726, -384.6428) (348.3514, -384.887) (348.1047, -385.0395) knots 0 0 0 0 0 0.322749 0.447008 0.569667 0.691923 1 1 1 1 1
  spline S74 degree 4 poles (348.1047, -385.0395) (347.8307, -385.2057) (347.496, -385.3436) (347.1142, -385.458) (346.6909, -385.5525) knots 0 0 0 0 0 1 1 1 1 1
  spline S75 degree 4 poles (346.6909, -385.5525) (347.0198, -385.6624) (347.3099, -385.7772) (347.5565, -385.8979) (347.7419, -386.028) knots 0 0 0 0 0 1 1 1 1 1
  spline S76 degree 4 poles (347.7419, -386.028) (347.9857, -386.1912) (348.3728, -386.7098) (348.7642, -387.2731) (348.943, -387.5294) knots 0 0 0 0 0 1 1 1 1 1
  line L117 (348.943, -387.5294) -> (350.8824, -391.2955)
  line L118 (350.8824, -391.2955) -> (346.3405, -391.2955)
  line L119 (346.3405, -391.2955) -> (344.201, -387.3167)
  spline S77 degree 4 poles (344.201, -387.3167) (344.0179, -386.9651) (343.8381, -386.6724) (343.662, -386.4348) (343.4878, -386.3157) knots 0 0 0 0 0 1 1 1 1 1
  spline S78 degree 4 poles (343.4878, -386.3157) (343.4088, -386.2821) (343.2985, -386.2387) (343.1573, -386.1886) (342.9856, -386.1353) (342.8174, -386.0877) (342.6805, -386.054) (342.5746, -386.0307) (342.4993, -386.0154) knots 0 0 0 0 0 0.319421 0.445306 0.570084 0.693867 1 1 1 1 1
  line L120 (342.4993, -386.0154) -> (342.149, -386.0154)
  line L121 (342.149, -386.0154) -> (342.149, -391.2955)
  line L122 (342.149, -391.2955) -> (338.1076, -391.2955)
  line L123 (338.1076, -391.2955) -> (338.1076, -378.2955)
  line L124 (327.3348, -389.1435) -> (326.6966, -391.2955)
  line L125 (326.6966, -391.2955) -> (322.5927, -391.2955)
  line L126 (322.5927, -391.2955) -> (327.4849, -378.2955)
  line L127 (327.4849, -378.2955) -> (331.8766, -378.2955)
  line L128 (331.8766, -378.2955) -> (336.7563, -391.2955)
  line L129 (336.7563, -391.2955) -> (332.5523, -391.2955)
  line L130 (332.5523, -391.2955) -> (331.9016, -389.1435)
  line L131 (331.9016, -389.1435) -> (327.3348, -389.1435)
  spline S79 degree 4 poles (304.175, -378.2955) (304.7349, -378.3254) (305.4521, -378.4569) (306.2431, -378.7599) (307.004, -379.3637) (307.6019, -380.0322) (307.9098, -380.6334) (308.0389, -381.1529) (308.0662, -381.5361) knots 0 0 0 0 0 0.339175 0.465743 0.588018 0.70738 1 1 1 1 1
  spline S80 degree 4 poles (308.0662, -381.5361) (308.0662, -381.7157) (308.0501, -381.9603) (307.9997, -382.2627) (307.8909, -382.6122) (307.7527, -382.9444) (307.6022, -383.1988) (307.4632, -383.3854) (307.353, -383.513) knots 0 0 0 0 0 0.318242 0.442778 0.566311 0.689578 1 1 1 1 1
  spline S81 degree 4 poles (307.353, -383.513) (307.0925, -383.7887) (306.7639, -384.026) (306.377, -384.2252) (305.9392, -384.3889) knots 0 0 0 0 0 1 1 1 1 1
  spline S82 degree 4 poles (305.9392, -384.3889) (306.3709, -384.4933) (306.9124, -384.6821) (307.505, -385.0107) (308.0317, -385.5503) (308.432, -386.1596) (308.6145, -386.7363) (308.6689, -387.232) (308.6668, -387.6045) knots 0 0 0 0 0 0.33021 0.452879 0.572465 0.691726 1 1 1 1 1
  spline S83 degree 4 poles (308.6668, -387.6045) (308.6652, -387.9112) (308.6202, -388.3285) (308.4873, -388.836) (308.2026, -389.4094) (307.8488, -389.9416) (307.4905, -390.3039) (307.1656, -390.5463) (306.9151, -390.6949) knots 0 0 0 0 0 0.316233 0.441052 0.565287 0.689327 1 1 1 1 1
  spline S84 degree 4 poles (306.9151, -390.6949) (306.6369, -390.8493) (306.2765, -390.966) (305.8583, -391.0549) (305.3887, -391.1204) knots 0 0 0 0 0 1 1 1 1 1
  spline S85 degree 2 poles (305.3887, -391.1204) (304.1262, -391.4374) (303.5869, -391.2955) knots 0 0 0 1 1 1
  line L132 (303.5869, -391.2955) -> (296.6553, -391.2955)
  line L133 (296.6553, -391.2955) -> (296.6553, -378.2955)
  line L134 (296.6553, -378.2955) -> (304.175, -378.2955)
  line L135 (264.0864, -378.2955) -> (268.9912, -385.4899)
  line L136 (268.9912, -385.4899) -> (268.9912, -378.2955)
  line L137 (268.9912, -378.2955) -> (272.7823, -378.2955)
  line L138 (272.7823, -378.2955) -> (272.7823, -391.2955)
  line L139 (272.7823, -391.2955) -> (268.9912, -391.2955)
  line L140 (268.9912, -391.2955) -> (264.1115, -384.1386)
  line L141 (264.1115, -384.1386) -> (264.1115, -391.2955)
  line L142 (264.1115, -391.2955) -> (260.3328, -391.2955)
  line L143 (260.3328, -391.2955) -> (260.3328, -378.2955)
  line L144 (260.3328, -378.2955) -> (264.0864, -378.2955)
  line L145 (242.2529, -378.2955) -> (244.868, -382.6747)
  line L146 (244.868, -382.6747) -> (247.4955, -378.2955)
  line L147 (247.4955, -378.2955) -> (251.9373, -378.2955)
  line L148 (251.9373, -378.2955) -> (246.8824, -385.8528)
  line L149 (246.8824, -385.8528) -> (246.8824, -391.2955)
  line L150 (246.8824, -391.2955) -> (242.8535, -391.2955)
  line L151 (242.8535, -391.2955) -> (242.8535, -385.8528)
  line L152 (242.8535, -385.8528) -> (237.7862, -378.2955)
  line L153 (237.7862, -378.2955) -> (242.2529, -378.2955)
  line L154 (224.7987, -378.2955) -> (224.7987, -381.0857)
  line L155 (224.7987, -381.0857) -> (218.918, -381.0857)
  line L156 (218.918, -381.0857) -> (218.918, -383.3504)
  line L157 (218.918, -383.3504) -> (223.9353, -383.3504)
  line L158 (223.9353, -383.3504) -> (223.9353, -385.9779)
  line L159 (223.9353, -385.9779) -> (218.918, -385.9779)
  line L160 (218.918, -385.9779) -> (218.918, -391.2955)
  line L161 (218.918, -391.2955) -> (214.8766, -391.2955)
  line L162 (214.8766, -391.2955) -> (214.8766, -378.2955)
  line L163 (214.8766, -378.2955) -> (224.7987, -378.2955)
  line L164 (230.9921, -378.2955) -> (230.9921, -388.0924)
  line L165 (230.9921, -388.0924) -> (237.2606, -388.0924)
  line L166 (237.2606, -388.0924) -> (237.2606, -391.2955)
  line L167 (237.2606, -391.2955) -> (226.9758, -391.2955)
  line L168 (226.9758, -391.2955) -> (226.9758, -378.2955)
  line L169 (226.9758, -378.2955) -> (230.9921, -378.2955)
  line L170 (257.43, -378.2955) -> (257.43, -391.2955)
  line L171 (257.43, -391.2955) -> (253.4012, -391.2955)
  line L172 (253.4012, -391.2955) -> (253.4012, -378.2955)
  line L173 (253.4012, -378.2955) -> (257.43, -378.2955)
  line L174 (282.0037, -383.8884) -> (288.2096, -383.8884)
  line L175 (288.2096, -383.8884) -> (288.2096, -389.4187)
  spline S86 degree 4 poles (288.2096, -389.4187) (286.4831, -390.5901) (285.1655, -391.2179) (283.6983, -391.3753) (281.8035, -391.5207) knots 0 0 0 0 0 1 1 1 1 1
  spline S87 degree 4 poles (281.8035, -391.5207) (280.7742, -391.5173) (279.4339, -391.3822) (278.0216, -390.8912) (276.6819, -389.7883) (275.631, -388.4051) (275.1054, -386.9264) (274.964, -385.7344) (274.9594, -384.7893) knots 0 0 0 0 0 0.324047 0.444069 0.562844 0.683396 1 1 1 1 1
  spline S88 degree 4 poles (274.9594, -384.7893) (274.9592, -384.1263) (275.0384, -383.2389) (275.2879, -382.1877) (275.8341, -381.0385) (276.5093, -380.0325) (277.2352, -379.366) (277.8961, -378.9465) (278.4127, -378.6959) knots 0 0 0 0 0 0.325346 0.450118 0.572591 0.694038 1 1 1 1 1
  spline S89 degree 4 poles (278.4127, -378.6959) (279.1198, -378.3623) (279.9695, -378.1615) (280.9229, -378.0705) (281.9661, -378.0703) knots 0 0 0 0 0 1 1 1 1 1
  spline S90 degree 4 poles (281.9661, -378.0703) (282.8845, -378.0757) (284.1551, -378.1355) (285.1849, -378.3646) (286.2488, -378.9704) (287.0813, -379.691) (287.5901, -380.4782) (287.8769, -381.1887) (288.0345, -381.7488) knots 0 0 0 0 0 0.355058 0.475172 0.589089 0.703004 1 1 1 1 1
  line L176 (288.0345, -381.7488) -> (284.1557, -382.4495)
  spline S91 degree 4 poles (284.1557, -382.4495) (284.0824, -382.2284) (283.9474, -381.9438) (283.717, -381.6297) (283.3481, -381.3278) (282.9198, -381.0813) (282.5061, -380.9653) (282.1504, -380.9259) (281.8785, -380.923) knots 0 0 0 0 0 0.307304 0.427941 0.549228 0.673035 1 1 1 1 1
  spline S92 degree 4 poles (281.8785, -380.923) (281.491, -380.923) (280.9742, -381) (280.3887, -381.2467) (279.7908, -381.7886) (279.2779, -382.5184) (279.0584, -383.3685) (278.9881, -384.1305) (278.9883, -384.7517) knots 0 0 0 0 0 0.291146 0.405883 0.523583 0.647981 1 1 1 1 1
  spline S93 degree 4 poles (278.9883, -384.7517) (278.9869, -385.4039) (279.0583, -386.201) (279.273, -387.0776) (279.792, -387.8163) (280.4082, -388.3522) (281.0297, -388.5952) (281.583, -388.6679) (282.0037, -388.668) knots 0 0 0 0 0 0.352198 0.475101 0.591203 0.705096 1 1 1 1 1
  spline S94 degree 4 poles (282.0037, -388.668) (282.7126, -388.5709) (283.3158, -388.6011) (283.9561, -388.3869) (284.6938, -387.8047) knots 0 0 0 0 0 1 1 1 1 1
  line L177 (284.6938, -387.8047) -> (284.6938, -386.591)
  line L178 (284.6938, -386.591) -> (282.0037, -386.591)
  line L179 (282.0037, -386.591) -> (282.0037, -383.8884)
  line L180 (321.5417, -378.2955) -> (321.5417, -381.0732)
  line L181 (321.5417, -381.0732) -> (314.8102, -381.0732)
  line L182 (314.8102, -381.0732) -> (314.8102, -383.1377)
  line L183 (314.8102, -383.1377) -> (321.0537, -383.1377)
  line L184 (321.0537, -383.1377) -> (321.0537, -385.7902)
  line L185 (321.0537, -385.7902) -> (314.8102, -385.7902)
  line L186 (314.8102, -385.7902) -> (314.8102, -388.3552)
  line L187 (314.8102, -388.3552) -> (321.7419, -388.3552)
  line L188 (321.7419, -388.3552) -> (321.7419, -391.2955)
  line L189 (321.7419, -391.2955) -> (310.7813, -391.2955)
  line L190 (310.7813, -391.2955) -> (310.7813, -378.2955)
  line L191 (310.7813, -378.2955) -> (321.5417, -378.2955)
  line L192 (377.4204, -378.2955) -> (377.4204, -382.8499)
  line L193 (377.4204, -382.8499) -> (381.8121, -382.8499)
  line L194 (381.8121, -382.8499) -> (381.8121, -378.2955)
  line L195 (381.8121, -378.2955) -> (385.8535, -378.2955)
  line L196 (385.8535, -378.2955) -> (385.8535, -391.2955)
  line L197 (385.8535, -391.2955) -> (381.8121, -391.2955)
  line L198 (381.8121, -391.2955) -> (381.8121, -386.0405)
  line L199 (381.8121, -386.0405) -> (377.4204, -386.0405)
  line L200 (377.4204, -386.0405) -> (377.4204, -391.2955)
  line L201 (377.4204, -391.2955) -> (373.404, -391.2955)
  line L202 (373.404, -391.2955) -> (373.404, -378.2955)
  line L203 (373.404, -378.2955) -> (377.4204, -378.2955)
  line L204 (428.0941, -378.2955) -> (428.0941, -381.5111)
  line L205 (428.0941, -381.5111) -> (423.9902, -381.5111)
  line L206 (423.9902, -381.5111) -> (423.9902, -391.2955)
  line L207 (423.9902, -391.2955) -> (419.9738, -391.2955)
  line L208 (419.9738, -391.2955) -> (419.9738, -381.5111)
  line L209 (419.9738, -381.5111) -> (415.8699, -381.5111)
  line L210 (415.8699, -381.5111) -> (415.8699, -378.2955)
  line L211 (415.8699, -378.2955) -> (428.0941, -378.2955)
  line L212 (171.8364, -220.7379) -> (174.8364, -220.7379)
  line L213 (173.3364, -220.7379) -> (173.3364, -236.2379) construction
  circle A63 centre (173.3364, -220.7379) radius 1.5
  line L214 (177.3364, -220.7379) -> (177.3364, -234.2379)
  line L215 (175.3364, -236.2379) -> (171.3364, -236.2379)
  line L216 (169.3364, -234.2379) -> (169.3364, -220.7379)
  line L217 (173.3364, -217.3893) -> (176.2364, -219.0636)
  line L218 (176.2364, -219.0636) -> (176.2364, -222.4122)
  line L219 (176.2364, -222.4122) -> (173.3364, -224.0865)
  line L220 (173.3364, -224.0865) -> (170.4364, -222.4122)
  line L221 (170.4364, -222.4122) -> (170.4364, -219.0636)
  line L222 (170.4364, -219.0636) -> (173.3364, -217.3893)
  arc A64 (169.3364, -234.2379) -> (171.3364, -236.2379) centre (171.3364, -234.2379) ccw
  arc A65 (175.3364, -236.2379) -> (177.3364, -234.2379) centre (175.3364, -234.2379) ccw
  line L223 (171.8364, -227.7379) -> (174.8364, -227.7379)
  arc A66 (177.3364, -220.7379) -> (169.3364, -220.7379) centre (173.3364, -220.7379) ccw
  point P0 (0, 0)
  point P1 (218.1029, -306.1501)
  point P2 (217.7711, -306.0189)
  point P3 (217.438, -305.918)
  point P4 (217.1025, -305.8465)
  point P5 (216.1317, -305.8111)
  point P6 (220.4641, -309.7454)
  point P7 (220.3589, -309.0629)
  point P8 (220.1899, -308.4523)
  point P9 (219.961, -307.9077)
  point P10 (219.674, -307.4272)
  point P11 (219.3262, -307.0038)
  point P12 (218.9146, -306.6332)
  point P13 (221.8691, -304.7083)
  point P14 (222.4809, -305.2967)
  point P15 (223.0203, -305.9674)
  point P16 (223.4883, -306.7242)
  point P17 (223.863, -307.5474)
  point P18 (224.1368, -308.4504)
  point P19 (224.3064, -309.442)
  point P20 (220.6009, -317.1173)
  point P21 (220.0426, -317.3543)
  point P22 (219.456, -317.5399)
  point P23 (218.8392, -317.6742)
  point P24 (217.3279, -317.9034)
  point P25 (224.3057, -311.5794)
  point P26 (224.1289, -312.5529)
  point P27 (223.8391, -313.4597)
  point P28 (223.4349, -314.3113)
  point P29 (222.9364, -315.0982)
  point P30 (222.3869, -315.7748)
  point P31 (221.7863, -316.3492)
  point P32 (216.2639, -315.1052)
  point P33 (217.2603, -315.006)
  point P34 (217.6163, -314.9602)
  point P35 (217.9599, -314.8826)
  point P36 (218.2929, -314.7725)
  point P37 (219.038, -314.3186)
  point P38 (219.4058, -313.9592)
  point P39 (219.7231, -313.5468)
  point P40 (219.9911, -313.0769)
  point P41 (220.2062, -312.5477)
  point P42 (220.3657, -311.9482)
  point P43 (220.4657, -311.2705)
  point P44 (211.6384, -289.448)
  point P45 (211.8223, -289.5166)
  point P46 (211.9931, -289.5844)
  point P47 (212.1533, -289.6511)
  point P48 (212.3039, -289.7167)
  point P49 (212.4448, -289.7815)
  point P50 (212.5747, -289.846)
  point P51 (207.6179, -311.1953)
  point P52 (207.8112, -311.428)
  point P53 (207.9891, -311.6936)
  point P54 (208.1501, -311.9926)
  point P55 (208.2788, -312.3081)
  point P56 (208.3737, -312.6575)
  point P57 (208.4331, -313.0445)
  point P58 (208.0176, -307.0744)
  point P59 (207.8765, -307.6459)
  point P60 (207.6439, -308.1814)
  point P61 (207.3173, -308.6866)
  point P62 (206.9167, -309.1302)
  point P63 (206.4621, -309.4863)
  point P64 (205.9482, -309.7589)
  point P65 (206.8959, -303.8699)
  point P66 (207.2045, -304.1529)
  point P67 (207.4637, -304.4645)
  point P68 (207.6765, -304.8068)
  point P69 (207.8448, -305.1804)
  point P70 (207.9662, -305.5782)
  point P71 (208.0403, -306.0034)
  point P72 (205.9082, -310.2287)
  point P73 (206.4333, -310.4218)
  point P74 (206.6742, -310.5231)
  point P75 (206.9167, -310.6506)
  point P76 (207.1615, -310.8065)
  point P77 (204.2707, -306.864)
  point P78 (204.2301, -306.6678)
  point P79 (204.1659, -306.4987)
  point P80 (204.0783, -306.3519)
  point P81 (203.964, -306.2128)
  point P82 (203.8391, -306.0917)
  point P83 (203.7032, -305.9877)
  point P84 (203.3869, -305.8294)
  point P85 (203.2016, -305.7688)
  point P86 (202.9984, -305.7189)
  point P87 (202.7763, -305.6803)
  point P88 (202.2712, -305.6181)
  point P89 (203.8669, -302.7727)
  point P90 (204.9426, -302.9589)
  point P91 (205.8214, -303.2446)
  point P92 (201.343, -305.6269)
  point P93 (200.7841, -305.7185)
  point P94 (200.2001, -305.8682)
  point P95 (200.3105, -305.5758)
  point P96 (200.9732, -305.1178)
  point P97 (198.6349, -303.3503)
  point P98 (199.8644, -303.0256)
  point P99 (201.1826, -302.7926)
  point P100 (217.2894, -303.0746)
  point P101 (218.7692, -303.2383)
  point P102 (219.3919, -303.3879)
  point P103 (220.0002, -303.5965)
  point P104 (220.5961, -303.8658)
  point P105 (208.4269, -314.0291)
  point P106 (208.3471, -314.5509)
  point P107 (208.2169, -315.0416)
  point P108 (208.037, -315.504)
  point P109 (207.8102, -315.9336)
  point P110 (207.538, -316.3285)
  point P111 (207.2187, -316.6909)
  point P112 (206.0386, -289.8991)
  point P113 (206.196, -289.8709)
  point P114 (206.3528, -289.8271)
  point P115 (206.5085, -289.7683)
  point P116 (206.6634, -289.6947)
  point P117 (206.8184, -289.606)
  point P118 (206.9749, -289.5012)
  point P119 (207.716, -289.6221)
  point P120 (208.2579, -289.7859)
  point P121 (208.7773, -289.8807)
  point P122 (209.2865, -289.9118)
  point P123 (209.7957, -289.8807)
  point P124 (210.3151, -289.7859)
  point P125 (210.8571, -289.6221)
  point P126 (206.7023, -288.9995)
  point P127 (206.419, -289.1476)
  point P128 (206.165, -289.2242)
  point P129 (205.9237, -289.2508)
  point P130 (205.6808, -289.2317)
  point P131 (205.4217, -289.1579)
  point P132 (205.1305, -289.0065)
  point P133 (210.8913, -289.0415)
  point P134 (210.3208, -289.2354)
  point P135 (209.7945, -289.3434)
  point P136 (209.2887, -289.3781)
  point P137 (208.7827, -289.3434)
  point P138 (208.2555, -289.2354)
  point P139 (207.6837, -289.0414)
  point P140 (213.574, -288.7783)
  point P141 (213.4035, -288.7141)
  point P142 (213.2433, -288.6066)
  point P143 (213.0673, -288.4971)
  point P144 (212.8453, -288.4245)
  point P145 (212.5405, -288.4298)
  point P146 (212.1143, -288.5396)
  point P147 (441.0192, -389.2837)
  point P148 (441.3317, -389.1832)
  point P149 (441.6141, -389.0176)
  point P150 (441.8713, -388.782)
  point P151 (442.0864, -388.4822)
  point P152 (442.2498, -388.1029)
  point P153 (442.3561, -387.6285)
  point P154 (283.6156, -378.1425)
  point P155 (284.7701, -378.3317)
  point P156 (285.5686, -378.6146)
  point P157 (286.2413, -379.0048)
  point P158 (286.8189, -379.5036)
  point P159 (287.3105, -380.1197)
  point P160 (287.717, -380.8628)
  point P161 (284.0116, -382.1043)
  point P162 (283.8282, -381.8079)
  point P163 (283.6065, -381.5545)
  point P164 (283.3453, -381.3402)
  point P165 (283.0464, -381.1675)
  point P166 (282.7065, -381.0384)
  point P167 (282.3195, -380.9554)
  point P168 (286.4608, -390.4641)
  point P169 (285.0539, -391.0233)
  point P170 (283.6086, -391.3361)
  point P171 (282.6539, -388.5992)
  point P172 (283.2495, -388.5124)
  point P173 (283.8828, -388.3072)
  point P174 (275.0192, -383.7158)
  point P175 (275.1934, -382.7394)
  point P176 (275.4761, -381.8505)
  point P177 (275.8641, -381.041)
  point P178 (276.3496, -380.3221)
  point P179 (276.9317, -379.6948)
  point P180 (277.6164, -379.1534)
  point P181 (279.086, -378.4364)
  point P182 (279.8924, -378.2397)
  point P183 (280.8473, -378.1144)
  point P184 (281.2589, -380.9806)
  point P185 (280.7193, -381.1449)
  point P186 (280.2455, -381.4124)
  point P187 (279.8281, -381.7879)
  point P188 (279.4852, -382.2718)
  point P189 (279.2224, -382.9064)
  point P190 (279.0507, -383.7225)
  point P191 (279.0511, -385.8396)
  point P192 (279.2241, -386.6876)
  point P193 (279.4869, -387.3324)
  point P194 (279.8299, -387.8133)
  point P195 (280.2523, -388.1808)
  point P196 (280.7463, -388.4458)
  point P197 (281.3246, -388.6104)
  point P198 (280.1002, -391.3967)
  point P199 (278.7312, -391.0488)
  dimension "d0" = 3
  dimension "d1" = 7
  dimension "d3" = 5.8
  dimension "d4" = 2
extrude "Выдавливание1" add sketch "Эскиз1" along normal blind 4 contours L16 L17 L18 L19 L20 L21 L22 L23 L24 L25 L26 L223
extrude "Выдавливание2" add sketch "Эскиз1" against normal blind 4 contours L214 A65 L215 L20 L19 L18 L17 L16 L15 | L15 L223 L27 L216 A66 L214 | L16 L17 L18 L19 L20 L21 L22 L23 L24 L25 L26 L223 | L26 L25 L24 L23 L22 L215 A64 L216 L27 | L217 L218 L219 L220 L221 L222
extrude "Выдавливание3" cut sketch "Эскиз1" against normal blind 4 contours L217 L218 L219 L220 L221 L222
extrude "Выдавливание4" add sketch "Эскиз1" against normal blind 2 contours L217 L218 L219 L220 L221 L222
properties part number "крепеж  для бокса"
